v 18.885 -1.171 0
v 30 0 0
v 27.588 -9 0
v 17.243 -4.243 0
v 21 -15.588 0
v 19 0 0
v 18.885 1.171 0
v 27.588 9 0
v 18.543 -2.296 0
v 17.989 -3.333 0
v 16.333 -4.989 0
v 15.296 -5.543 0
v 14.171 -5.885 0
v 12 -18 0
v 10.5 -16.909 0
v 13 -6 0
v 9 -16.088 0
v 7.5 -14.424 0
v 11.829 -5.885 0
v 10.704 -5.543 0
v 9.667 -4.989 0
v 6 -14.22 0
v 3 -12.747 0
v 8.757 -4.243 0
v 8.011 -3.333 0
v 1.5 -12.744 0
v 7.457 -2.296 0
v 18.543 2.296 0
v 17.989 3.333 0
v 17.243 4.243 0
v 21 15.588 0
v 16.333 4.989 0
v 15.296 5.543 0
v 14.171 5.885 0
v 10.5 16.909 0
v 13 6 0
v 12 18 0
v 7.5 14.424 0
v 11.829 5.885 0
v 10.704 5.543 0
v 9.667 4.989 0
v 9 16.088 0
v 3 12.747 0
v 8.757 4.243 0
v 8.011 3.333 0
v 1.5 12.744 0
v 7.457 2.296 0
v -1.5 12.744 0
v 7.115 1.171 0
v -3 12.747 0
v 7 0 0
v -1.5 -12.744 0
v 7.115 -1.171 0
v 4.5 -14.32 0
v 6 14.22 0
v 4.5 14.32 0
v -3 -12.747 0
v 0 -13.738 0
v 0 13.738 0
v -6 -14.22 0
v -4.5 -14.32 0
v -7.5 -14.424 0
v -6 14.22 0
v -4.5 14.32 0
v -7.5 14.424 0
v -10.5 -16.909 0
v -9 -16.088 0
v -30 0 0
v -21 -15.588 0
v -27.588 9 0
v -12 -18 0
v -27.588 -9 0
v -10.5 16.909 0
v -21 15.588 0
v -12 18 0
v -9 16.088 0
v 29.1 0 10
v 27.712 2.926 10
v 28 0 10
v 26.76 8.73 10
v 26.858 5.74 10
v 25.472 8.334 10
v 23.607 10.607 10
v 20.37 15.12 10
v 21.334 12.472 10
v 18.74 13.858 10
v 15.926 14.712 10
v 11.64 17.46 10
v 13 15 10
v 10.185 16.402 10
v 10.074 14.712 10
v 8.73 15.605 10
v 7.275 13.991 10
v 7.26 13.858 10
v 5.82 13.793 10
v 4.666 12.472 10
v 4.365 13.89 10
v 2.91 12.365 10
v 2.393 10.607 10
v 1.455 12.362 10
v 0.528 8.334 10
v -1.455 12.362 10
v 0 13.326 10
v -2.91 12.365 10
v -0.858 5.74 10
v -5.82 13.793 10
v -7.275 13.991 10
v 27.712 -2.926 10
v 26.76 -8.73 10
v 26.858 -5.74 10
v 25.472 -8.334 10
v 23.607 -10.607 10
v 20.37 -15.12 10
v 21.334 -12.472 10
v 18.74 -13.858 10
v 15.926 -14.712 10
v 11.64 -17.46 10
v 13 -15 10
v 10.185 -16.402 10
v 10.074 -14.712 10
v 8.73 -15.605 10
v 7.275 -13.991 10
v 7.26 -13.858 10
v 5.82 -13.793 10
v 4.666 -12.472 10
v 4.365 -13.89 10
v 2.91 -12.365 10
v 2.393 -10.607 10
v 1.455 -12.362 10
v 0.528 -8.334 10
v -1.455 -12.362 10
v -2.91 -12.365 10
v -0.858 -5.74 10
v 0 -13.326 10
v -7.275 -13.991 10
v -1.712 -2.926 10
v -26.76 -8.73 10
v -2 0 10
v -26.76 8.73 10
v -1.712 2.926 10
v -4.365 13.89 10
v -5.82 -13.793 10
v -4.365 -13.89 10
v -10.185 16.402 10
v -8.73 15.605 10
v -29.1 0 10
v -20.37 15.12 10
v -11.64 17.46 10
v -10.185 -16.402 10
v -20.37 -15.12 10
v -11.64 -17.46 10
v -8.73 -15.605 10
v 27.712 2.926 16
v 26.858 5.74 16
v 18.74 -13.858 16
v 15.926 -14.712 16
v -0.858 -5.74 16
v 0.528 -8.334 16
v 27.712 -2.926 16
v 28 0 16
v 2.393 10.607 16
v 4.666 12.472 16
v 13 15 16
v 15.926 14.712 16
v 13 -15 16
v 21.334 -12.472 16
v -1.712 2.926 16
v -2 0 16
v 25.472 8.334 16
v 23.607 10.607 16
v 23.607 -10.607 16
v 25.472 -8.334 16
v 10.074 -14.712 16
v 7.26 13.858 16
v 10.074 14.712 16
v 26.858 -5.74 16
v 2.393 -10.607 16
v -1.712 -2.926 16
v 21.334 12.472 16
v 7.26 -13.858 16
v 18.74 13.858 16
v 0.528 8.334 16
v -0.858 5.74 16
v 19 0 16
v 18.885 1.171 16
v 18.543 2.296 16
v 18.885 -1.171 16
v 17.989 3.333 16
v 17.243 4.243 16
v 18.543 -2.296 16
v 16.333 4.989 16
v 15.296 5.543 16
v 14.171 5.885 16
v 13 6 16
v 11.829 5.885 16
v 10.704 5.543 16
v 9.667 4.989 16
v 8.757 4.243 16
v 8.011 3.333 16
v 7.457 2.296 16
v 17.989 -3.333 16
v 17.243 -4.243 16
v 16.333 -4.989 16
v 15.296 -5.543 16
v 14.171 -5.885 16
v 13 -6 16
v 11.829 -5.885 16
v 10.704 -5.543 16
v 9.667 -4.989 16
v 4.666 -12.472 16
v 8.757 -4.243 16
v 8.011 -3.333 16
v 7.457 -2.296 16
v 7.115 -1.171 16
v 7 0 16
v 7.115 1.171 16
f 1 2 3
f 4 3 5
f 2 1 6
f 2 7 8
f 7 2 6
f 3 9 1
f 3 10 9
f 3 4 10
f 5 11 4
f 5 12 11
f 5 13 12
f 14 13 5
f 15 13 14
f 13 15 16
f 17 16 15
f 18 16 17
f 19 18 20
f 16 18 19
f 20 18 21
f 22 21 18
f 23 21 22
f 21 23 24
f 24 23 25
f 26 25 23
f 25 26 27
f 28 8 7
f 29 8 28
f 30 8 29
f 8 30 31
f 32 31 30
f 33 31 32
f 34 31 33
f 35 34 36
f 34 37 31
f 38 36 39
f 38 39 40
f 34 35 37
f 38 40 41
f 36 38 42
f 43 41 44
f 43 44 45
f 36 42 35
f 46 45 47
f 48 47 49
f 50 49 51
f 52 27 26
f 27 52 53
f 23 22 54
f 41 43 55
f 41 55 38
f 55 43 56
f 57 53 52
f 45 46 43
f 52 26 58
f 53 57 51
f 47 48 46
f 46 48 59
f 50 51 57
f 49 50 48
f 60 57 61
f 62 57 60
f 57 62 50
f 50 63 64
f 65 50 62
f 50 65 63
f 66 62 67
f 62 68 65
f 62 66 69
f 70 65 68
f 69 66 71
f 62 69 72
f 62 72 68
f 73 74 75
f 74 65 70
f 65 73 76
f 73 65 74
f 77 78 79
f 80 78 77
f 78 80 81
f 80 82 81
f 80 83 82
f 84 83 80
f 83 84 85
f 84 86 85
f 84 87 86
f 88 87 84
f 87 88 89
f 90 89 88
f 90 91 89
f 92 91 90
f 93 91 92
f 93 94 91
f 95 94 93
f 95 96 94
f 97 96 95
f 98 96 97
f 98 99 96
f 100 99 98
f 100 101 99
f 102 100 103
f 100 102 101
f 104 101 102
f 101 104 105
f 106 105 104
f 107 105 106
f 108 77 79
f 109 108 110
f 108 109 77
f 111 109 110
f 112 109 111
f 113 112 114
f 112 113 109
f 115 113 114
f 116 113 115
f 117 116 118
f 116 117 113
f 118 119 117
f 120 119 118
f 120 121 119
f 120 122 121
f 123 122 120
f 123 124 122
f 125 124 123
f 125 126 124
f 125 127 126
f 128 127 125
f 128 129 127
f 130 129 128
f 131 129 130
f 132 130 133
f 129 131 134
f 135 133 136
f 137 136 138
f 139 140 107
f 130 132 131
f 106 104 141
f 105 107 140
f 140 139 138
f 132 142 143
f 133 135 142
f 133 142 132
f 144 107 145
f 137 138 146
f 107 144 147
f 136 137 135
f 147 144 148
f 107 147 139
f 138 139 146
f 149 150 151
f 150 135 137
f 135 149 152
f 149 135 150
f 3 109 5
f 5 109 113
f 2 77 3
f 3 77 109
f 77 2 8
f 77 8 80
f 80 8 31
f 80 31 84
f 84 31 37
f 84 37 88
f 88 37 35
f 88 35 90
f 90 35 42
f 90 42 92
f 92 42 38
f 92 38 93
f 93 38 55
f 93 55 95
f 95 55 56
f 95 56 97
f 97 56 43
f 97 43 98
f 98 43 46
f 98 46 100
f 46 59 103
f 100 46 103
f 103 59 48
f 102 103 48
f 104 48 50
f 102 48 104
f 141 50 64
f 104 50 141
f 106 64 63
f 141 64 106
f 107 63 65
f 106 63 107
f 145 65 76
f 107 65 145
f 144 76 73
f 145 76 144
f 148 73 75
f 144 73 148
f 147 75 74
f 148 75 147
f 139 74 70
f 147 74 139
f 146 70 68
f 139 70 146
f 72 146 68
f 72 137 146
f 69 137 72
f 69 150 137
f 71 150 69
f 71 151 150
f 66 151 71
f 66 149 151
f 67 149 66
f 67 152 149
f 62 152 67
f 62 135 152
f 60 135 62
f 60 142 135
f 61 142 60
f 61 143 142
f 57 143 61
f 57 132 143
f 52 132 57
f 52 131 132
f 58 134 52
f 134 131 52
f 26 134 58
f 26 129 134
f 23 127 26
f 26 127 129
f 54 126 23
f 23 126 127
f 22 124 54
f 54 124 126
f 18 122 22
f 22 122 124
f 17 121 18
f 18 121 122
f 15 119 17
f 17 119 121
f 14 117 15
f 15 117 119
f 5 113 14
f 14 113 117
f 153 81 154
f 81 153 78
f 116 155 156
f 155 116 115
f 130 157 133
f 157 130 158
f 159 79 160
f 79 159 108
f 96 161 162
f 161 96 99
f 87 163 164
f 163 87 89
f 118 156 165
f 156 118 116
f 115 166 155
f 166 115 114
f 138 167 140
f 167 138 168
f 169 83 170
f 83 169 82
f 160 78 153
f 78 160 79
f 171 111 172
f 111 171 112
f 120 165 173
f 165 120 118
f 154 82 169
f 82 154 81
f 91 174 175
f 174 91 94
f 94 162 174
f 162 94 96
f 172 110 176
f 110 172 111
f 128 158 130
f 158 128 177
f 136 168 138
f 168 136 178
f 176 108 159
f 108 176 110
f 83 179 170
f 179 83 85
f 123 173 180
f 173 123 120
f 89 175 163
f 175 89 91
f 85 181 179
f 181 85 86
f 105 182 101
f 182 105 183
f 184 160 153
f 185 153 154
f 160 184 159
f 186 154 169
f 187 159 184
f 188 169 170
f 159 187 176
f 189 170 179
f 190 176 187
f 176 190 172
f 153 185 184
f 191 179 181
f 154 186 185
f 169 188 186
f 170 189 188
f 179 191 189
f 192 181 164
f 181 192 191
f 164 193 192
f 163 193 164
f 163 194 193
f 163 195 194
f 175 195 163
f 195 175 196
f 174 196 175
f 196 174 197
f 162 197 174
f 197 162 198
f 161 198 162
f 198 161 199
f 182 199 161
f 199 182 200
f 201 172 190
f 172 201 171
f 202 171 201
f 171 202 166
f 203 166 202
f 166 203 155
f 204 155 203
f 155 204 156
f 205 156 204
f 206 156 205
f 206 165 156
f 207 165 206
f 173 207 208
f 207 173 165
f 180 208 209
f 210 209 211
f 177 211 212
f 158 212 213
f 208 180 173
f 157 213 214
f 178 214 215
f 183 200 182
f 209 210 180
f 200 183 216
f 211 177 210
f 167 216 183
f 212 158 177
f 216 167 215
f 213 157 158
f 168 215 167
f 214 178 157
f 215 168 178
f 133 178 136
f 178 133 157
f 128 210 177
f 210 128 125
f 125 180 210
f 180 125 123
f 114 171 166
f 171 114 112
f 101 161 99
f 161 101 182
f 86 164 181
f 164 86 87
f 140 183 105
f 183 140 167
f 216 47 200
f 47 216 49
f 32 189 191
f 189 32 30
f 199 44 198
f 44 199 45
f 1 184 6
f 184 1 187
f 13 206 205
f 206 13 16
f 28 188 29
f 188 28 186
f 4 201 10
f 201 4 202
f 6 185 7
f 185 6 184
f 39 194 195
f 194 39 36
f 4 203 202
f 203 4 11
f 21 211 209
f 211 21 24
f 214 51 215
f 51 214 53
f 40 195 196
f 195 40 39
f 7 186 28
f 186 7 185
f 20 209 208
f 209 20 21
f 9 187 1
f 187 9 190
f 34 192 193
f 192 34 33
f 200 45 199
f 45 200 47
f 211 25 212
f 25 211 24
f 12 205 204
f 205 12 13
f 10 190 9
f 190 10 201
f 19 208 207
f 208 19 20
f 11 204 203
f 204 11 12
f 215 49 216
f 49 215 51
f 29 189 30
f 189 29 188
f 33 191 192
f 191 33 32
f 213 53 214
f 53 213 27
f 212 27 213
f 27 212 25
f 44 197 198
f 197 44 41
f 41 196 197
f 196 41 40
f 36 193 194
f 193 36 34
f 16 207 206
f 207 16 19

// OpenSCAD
$fn = 32;

// ----------------------------------------------------------------------
// Handle: 60 x 36 mm grip, 10 mm thick
// ----------------------------------------------------------------------

// --- parameters (mm) ---
length = 60;              // grip length
width = 36;               // grip width
thickness = 10;           // grip thickness
waist = 0.72;             // width factor at the middle
draft = 0.97;             // top face scale of the extrusion
scallops = 5;             // finger rests per side
ripple = 0.06;            // depth factor of the finger rests
boss_d = 30;              // mounting boss diameter
boss_h = 6;               // mounting boss height
boss_hole_d = 12;         // screw clearance through the boss
boss_r = 13;              // boss centre from the grip centre

/* ergonomic grip outline, closed spline-like polygon in the XY plane */
grip = [[-12, 18], [-10.5, 16.909], [-9, 16.088], [-7.5, 14.424], [-6, 14.22], [-4.5, 14.32], [-3, 12.747], [-1.5, 12.744], [0, 13.738], [1.5, 12.744], [3, 12.747], [4.5, 14.32], [6, 14.22], [7.5, 14.424], [9, 16.088], [10.5, 16.909], [12, 18], [21, 15.588], [27.588, 9], [30, 0], [27.588, -9], [21, -15.588], [12, -18], [12, -18], [10.5, -16.909], [9, -16.088], [7.5, -14.424], [6, -14.22], [4.5, -14.32], [3, -12.747], [1.5, -12.744], [0, -13.738], [-1.5, -12.744], [-3, -12.747], [-4.5, -14.32], [-6, -14.22], [-7.5, -14.424], [-9, -16.088], [-10.5, -16.909], [-12, -18], [-21, -15.588], [-27.588, -9], [-30, 0], [-27.588, 9], [-21, 15.588], [-12, 18]];

module grip_body() {
  linear_extrude(height = thickness, scale = draft) polygon(grip);
}

module boss_body() {
  /* sunk 1 mm into the grip so the joint overlaps */
  translate([boss_r, 0, thickness - 1]) cylinder(h = boss_h + 1, d = boss_d);
}

difference() {
  union() {
    grip_body();
    boss_body();
  }
  translate([boss_r, 0, -1]) cylinder(h = thickness + boss_h + 2, d = boss_hole_d);
}
